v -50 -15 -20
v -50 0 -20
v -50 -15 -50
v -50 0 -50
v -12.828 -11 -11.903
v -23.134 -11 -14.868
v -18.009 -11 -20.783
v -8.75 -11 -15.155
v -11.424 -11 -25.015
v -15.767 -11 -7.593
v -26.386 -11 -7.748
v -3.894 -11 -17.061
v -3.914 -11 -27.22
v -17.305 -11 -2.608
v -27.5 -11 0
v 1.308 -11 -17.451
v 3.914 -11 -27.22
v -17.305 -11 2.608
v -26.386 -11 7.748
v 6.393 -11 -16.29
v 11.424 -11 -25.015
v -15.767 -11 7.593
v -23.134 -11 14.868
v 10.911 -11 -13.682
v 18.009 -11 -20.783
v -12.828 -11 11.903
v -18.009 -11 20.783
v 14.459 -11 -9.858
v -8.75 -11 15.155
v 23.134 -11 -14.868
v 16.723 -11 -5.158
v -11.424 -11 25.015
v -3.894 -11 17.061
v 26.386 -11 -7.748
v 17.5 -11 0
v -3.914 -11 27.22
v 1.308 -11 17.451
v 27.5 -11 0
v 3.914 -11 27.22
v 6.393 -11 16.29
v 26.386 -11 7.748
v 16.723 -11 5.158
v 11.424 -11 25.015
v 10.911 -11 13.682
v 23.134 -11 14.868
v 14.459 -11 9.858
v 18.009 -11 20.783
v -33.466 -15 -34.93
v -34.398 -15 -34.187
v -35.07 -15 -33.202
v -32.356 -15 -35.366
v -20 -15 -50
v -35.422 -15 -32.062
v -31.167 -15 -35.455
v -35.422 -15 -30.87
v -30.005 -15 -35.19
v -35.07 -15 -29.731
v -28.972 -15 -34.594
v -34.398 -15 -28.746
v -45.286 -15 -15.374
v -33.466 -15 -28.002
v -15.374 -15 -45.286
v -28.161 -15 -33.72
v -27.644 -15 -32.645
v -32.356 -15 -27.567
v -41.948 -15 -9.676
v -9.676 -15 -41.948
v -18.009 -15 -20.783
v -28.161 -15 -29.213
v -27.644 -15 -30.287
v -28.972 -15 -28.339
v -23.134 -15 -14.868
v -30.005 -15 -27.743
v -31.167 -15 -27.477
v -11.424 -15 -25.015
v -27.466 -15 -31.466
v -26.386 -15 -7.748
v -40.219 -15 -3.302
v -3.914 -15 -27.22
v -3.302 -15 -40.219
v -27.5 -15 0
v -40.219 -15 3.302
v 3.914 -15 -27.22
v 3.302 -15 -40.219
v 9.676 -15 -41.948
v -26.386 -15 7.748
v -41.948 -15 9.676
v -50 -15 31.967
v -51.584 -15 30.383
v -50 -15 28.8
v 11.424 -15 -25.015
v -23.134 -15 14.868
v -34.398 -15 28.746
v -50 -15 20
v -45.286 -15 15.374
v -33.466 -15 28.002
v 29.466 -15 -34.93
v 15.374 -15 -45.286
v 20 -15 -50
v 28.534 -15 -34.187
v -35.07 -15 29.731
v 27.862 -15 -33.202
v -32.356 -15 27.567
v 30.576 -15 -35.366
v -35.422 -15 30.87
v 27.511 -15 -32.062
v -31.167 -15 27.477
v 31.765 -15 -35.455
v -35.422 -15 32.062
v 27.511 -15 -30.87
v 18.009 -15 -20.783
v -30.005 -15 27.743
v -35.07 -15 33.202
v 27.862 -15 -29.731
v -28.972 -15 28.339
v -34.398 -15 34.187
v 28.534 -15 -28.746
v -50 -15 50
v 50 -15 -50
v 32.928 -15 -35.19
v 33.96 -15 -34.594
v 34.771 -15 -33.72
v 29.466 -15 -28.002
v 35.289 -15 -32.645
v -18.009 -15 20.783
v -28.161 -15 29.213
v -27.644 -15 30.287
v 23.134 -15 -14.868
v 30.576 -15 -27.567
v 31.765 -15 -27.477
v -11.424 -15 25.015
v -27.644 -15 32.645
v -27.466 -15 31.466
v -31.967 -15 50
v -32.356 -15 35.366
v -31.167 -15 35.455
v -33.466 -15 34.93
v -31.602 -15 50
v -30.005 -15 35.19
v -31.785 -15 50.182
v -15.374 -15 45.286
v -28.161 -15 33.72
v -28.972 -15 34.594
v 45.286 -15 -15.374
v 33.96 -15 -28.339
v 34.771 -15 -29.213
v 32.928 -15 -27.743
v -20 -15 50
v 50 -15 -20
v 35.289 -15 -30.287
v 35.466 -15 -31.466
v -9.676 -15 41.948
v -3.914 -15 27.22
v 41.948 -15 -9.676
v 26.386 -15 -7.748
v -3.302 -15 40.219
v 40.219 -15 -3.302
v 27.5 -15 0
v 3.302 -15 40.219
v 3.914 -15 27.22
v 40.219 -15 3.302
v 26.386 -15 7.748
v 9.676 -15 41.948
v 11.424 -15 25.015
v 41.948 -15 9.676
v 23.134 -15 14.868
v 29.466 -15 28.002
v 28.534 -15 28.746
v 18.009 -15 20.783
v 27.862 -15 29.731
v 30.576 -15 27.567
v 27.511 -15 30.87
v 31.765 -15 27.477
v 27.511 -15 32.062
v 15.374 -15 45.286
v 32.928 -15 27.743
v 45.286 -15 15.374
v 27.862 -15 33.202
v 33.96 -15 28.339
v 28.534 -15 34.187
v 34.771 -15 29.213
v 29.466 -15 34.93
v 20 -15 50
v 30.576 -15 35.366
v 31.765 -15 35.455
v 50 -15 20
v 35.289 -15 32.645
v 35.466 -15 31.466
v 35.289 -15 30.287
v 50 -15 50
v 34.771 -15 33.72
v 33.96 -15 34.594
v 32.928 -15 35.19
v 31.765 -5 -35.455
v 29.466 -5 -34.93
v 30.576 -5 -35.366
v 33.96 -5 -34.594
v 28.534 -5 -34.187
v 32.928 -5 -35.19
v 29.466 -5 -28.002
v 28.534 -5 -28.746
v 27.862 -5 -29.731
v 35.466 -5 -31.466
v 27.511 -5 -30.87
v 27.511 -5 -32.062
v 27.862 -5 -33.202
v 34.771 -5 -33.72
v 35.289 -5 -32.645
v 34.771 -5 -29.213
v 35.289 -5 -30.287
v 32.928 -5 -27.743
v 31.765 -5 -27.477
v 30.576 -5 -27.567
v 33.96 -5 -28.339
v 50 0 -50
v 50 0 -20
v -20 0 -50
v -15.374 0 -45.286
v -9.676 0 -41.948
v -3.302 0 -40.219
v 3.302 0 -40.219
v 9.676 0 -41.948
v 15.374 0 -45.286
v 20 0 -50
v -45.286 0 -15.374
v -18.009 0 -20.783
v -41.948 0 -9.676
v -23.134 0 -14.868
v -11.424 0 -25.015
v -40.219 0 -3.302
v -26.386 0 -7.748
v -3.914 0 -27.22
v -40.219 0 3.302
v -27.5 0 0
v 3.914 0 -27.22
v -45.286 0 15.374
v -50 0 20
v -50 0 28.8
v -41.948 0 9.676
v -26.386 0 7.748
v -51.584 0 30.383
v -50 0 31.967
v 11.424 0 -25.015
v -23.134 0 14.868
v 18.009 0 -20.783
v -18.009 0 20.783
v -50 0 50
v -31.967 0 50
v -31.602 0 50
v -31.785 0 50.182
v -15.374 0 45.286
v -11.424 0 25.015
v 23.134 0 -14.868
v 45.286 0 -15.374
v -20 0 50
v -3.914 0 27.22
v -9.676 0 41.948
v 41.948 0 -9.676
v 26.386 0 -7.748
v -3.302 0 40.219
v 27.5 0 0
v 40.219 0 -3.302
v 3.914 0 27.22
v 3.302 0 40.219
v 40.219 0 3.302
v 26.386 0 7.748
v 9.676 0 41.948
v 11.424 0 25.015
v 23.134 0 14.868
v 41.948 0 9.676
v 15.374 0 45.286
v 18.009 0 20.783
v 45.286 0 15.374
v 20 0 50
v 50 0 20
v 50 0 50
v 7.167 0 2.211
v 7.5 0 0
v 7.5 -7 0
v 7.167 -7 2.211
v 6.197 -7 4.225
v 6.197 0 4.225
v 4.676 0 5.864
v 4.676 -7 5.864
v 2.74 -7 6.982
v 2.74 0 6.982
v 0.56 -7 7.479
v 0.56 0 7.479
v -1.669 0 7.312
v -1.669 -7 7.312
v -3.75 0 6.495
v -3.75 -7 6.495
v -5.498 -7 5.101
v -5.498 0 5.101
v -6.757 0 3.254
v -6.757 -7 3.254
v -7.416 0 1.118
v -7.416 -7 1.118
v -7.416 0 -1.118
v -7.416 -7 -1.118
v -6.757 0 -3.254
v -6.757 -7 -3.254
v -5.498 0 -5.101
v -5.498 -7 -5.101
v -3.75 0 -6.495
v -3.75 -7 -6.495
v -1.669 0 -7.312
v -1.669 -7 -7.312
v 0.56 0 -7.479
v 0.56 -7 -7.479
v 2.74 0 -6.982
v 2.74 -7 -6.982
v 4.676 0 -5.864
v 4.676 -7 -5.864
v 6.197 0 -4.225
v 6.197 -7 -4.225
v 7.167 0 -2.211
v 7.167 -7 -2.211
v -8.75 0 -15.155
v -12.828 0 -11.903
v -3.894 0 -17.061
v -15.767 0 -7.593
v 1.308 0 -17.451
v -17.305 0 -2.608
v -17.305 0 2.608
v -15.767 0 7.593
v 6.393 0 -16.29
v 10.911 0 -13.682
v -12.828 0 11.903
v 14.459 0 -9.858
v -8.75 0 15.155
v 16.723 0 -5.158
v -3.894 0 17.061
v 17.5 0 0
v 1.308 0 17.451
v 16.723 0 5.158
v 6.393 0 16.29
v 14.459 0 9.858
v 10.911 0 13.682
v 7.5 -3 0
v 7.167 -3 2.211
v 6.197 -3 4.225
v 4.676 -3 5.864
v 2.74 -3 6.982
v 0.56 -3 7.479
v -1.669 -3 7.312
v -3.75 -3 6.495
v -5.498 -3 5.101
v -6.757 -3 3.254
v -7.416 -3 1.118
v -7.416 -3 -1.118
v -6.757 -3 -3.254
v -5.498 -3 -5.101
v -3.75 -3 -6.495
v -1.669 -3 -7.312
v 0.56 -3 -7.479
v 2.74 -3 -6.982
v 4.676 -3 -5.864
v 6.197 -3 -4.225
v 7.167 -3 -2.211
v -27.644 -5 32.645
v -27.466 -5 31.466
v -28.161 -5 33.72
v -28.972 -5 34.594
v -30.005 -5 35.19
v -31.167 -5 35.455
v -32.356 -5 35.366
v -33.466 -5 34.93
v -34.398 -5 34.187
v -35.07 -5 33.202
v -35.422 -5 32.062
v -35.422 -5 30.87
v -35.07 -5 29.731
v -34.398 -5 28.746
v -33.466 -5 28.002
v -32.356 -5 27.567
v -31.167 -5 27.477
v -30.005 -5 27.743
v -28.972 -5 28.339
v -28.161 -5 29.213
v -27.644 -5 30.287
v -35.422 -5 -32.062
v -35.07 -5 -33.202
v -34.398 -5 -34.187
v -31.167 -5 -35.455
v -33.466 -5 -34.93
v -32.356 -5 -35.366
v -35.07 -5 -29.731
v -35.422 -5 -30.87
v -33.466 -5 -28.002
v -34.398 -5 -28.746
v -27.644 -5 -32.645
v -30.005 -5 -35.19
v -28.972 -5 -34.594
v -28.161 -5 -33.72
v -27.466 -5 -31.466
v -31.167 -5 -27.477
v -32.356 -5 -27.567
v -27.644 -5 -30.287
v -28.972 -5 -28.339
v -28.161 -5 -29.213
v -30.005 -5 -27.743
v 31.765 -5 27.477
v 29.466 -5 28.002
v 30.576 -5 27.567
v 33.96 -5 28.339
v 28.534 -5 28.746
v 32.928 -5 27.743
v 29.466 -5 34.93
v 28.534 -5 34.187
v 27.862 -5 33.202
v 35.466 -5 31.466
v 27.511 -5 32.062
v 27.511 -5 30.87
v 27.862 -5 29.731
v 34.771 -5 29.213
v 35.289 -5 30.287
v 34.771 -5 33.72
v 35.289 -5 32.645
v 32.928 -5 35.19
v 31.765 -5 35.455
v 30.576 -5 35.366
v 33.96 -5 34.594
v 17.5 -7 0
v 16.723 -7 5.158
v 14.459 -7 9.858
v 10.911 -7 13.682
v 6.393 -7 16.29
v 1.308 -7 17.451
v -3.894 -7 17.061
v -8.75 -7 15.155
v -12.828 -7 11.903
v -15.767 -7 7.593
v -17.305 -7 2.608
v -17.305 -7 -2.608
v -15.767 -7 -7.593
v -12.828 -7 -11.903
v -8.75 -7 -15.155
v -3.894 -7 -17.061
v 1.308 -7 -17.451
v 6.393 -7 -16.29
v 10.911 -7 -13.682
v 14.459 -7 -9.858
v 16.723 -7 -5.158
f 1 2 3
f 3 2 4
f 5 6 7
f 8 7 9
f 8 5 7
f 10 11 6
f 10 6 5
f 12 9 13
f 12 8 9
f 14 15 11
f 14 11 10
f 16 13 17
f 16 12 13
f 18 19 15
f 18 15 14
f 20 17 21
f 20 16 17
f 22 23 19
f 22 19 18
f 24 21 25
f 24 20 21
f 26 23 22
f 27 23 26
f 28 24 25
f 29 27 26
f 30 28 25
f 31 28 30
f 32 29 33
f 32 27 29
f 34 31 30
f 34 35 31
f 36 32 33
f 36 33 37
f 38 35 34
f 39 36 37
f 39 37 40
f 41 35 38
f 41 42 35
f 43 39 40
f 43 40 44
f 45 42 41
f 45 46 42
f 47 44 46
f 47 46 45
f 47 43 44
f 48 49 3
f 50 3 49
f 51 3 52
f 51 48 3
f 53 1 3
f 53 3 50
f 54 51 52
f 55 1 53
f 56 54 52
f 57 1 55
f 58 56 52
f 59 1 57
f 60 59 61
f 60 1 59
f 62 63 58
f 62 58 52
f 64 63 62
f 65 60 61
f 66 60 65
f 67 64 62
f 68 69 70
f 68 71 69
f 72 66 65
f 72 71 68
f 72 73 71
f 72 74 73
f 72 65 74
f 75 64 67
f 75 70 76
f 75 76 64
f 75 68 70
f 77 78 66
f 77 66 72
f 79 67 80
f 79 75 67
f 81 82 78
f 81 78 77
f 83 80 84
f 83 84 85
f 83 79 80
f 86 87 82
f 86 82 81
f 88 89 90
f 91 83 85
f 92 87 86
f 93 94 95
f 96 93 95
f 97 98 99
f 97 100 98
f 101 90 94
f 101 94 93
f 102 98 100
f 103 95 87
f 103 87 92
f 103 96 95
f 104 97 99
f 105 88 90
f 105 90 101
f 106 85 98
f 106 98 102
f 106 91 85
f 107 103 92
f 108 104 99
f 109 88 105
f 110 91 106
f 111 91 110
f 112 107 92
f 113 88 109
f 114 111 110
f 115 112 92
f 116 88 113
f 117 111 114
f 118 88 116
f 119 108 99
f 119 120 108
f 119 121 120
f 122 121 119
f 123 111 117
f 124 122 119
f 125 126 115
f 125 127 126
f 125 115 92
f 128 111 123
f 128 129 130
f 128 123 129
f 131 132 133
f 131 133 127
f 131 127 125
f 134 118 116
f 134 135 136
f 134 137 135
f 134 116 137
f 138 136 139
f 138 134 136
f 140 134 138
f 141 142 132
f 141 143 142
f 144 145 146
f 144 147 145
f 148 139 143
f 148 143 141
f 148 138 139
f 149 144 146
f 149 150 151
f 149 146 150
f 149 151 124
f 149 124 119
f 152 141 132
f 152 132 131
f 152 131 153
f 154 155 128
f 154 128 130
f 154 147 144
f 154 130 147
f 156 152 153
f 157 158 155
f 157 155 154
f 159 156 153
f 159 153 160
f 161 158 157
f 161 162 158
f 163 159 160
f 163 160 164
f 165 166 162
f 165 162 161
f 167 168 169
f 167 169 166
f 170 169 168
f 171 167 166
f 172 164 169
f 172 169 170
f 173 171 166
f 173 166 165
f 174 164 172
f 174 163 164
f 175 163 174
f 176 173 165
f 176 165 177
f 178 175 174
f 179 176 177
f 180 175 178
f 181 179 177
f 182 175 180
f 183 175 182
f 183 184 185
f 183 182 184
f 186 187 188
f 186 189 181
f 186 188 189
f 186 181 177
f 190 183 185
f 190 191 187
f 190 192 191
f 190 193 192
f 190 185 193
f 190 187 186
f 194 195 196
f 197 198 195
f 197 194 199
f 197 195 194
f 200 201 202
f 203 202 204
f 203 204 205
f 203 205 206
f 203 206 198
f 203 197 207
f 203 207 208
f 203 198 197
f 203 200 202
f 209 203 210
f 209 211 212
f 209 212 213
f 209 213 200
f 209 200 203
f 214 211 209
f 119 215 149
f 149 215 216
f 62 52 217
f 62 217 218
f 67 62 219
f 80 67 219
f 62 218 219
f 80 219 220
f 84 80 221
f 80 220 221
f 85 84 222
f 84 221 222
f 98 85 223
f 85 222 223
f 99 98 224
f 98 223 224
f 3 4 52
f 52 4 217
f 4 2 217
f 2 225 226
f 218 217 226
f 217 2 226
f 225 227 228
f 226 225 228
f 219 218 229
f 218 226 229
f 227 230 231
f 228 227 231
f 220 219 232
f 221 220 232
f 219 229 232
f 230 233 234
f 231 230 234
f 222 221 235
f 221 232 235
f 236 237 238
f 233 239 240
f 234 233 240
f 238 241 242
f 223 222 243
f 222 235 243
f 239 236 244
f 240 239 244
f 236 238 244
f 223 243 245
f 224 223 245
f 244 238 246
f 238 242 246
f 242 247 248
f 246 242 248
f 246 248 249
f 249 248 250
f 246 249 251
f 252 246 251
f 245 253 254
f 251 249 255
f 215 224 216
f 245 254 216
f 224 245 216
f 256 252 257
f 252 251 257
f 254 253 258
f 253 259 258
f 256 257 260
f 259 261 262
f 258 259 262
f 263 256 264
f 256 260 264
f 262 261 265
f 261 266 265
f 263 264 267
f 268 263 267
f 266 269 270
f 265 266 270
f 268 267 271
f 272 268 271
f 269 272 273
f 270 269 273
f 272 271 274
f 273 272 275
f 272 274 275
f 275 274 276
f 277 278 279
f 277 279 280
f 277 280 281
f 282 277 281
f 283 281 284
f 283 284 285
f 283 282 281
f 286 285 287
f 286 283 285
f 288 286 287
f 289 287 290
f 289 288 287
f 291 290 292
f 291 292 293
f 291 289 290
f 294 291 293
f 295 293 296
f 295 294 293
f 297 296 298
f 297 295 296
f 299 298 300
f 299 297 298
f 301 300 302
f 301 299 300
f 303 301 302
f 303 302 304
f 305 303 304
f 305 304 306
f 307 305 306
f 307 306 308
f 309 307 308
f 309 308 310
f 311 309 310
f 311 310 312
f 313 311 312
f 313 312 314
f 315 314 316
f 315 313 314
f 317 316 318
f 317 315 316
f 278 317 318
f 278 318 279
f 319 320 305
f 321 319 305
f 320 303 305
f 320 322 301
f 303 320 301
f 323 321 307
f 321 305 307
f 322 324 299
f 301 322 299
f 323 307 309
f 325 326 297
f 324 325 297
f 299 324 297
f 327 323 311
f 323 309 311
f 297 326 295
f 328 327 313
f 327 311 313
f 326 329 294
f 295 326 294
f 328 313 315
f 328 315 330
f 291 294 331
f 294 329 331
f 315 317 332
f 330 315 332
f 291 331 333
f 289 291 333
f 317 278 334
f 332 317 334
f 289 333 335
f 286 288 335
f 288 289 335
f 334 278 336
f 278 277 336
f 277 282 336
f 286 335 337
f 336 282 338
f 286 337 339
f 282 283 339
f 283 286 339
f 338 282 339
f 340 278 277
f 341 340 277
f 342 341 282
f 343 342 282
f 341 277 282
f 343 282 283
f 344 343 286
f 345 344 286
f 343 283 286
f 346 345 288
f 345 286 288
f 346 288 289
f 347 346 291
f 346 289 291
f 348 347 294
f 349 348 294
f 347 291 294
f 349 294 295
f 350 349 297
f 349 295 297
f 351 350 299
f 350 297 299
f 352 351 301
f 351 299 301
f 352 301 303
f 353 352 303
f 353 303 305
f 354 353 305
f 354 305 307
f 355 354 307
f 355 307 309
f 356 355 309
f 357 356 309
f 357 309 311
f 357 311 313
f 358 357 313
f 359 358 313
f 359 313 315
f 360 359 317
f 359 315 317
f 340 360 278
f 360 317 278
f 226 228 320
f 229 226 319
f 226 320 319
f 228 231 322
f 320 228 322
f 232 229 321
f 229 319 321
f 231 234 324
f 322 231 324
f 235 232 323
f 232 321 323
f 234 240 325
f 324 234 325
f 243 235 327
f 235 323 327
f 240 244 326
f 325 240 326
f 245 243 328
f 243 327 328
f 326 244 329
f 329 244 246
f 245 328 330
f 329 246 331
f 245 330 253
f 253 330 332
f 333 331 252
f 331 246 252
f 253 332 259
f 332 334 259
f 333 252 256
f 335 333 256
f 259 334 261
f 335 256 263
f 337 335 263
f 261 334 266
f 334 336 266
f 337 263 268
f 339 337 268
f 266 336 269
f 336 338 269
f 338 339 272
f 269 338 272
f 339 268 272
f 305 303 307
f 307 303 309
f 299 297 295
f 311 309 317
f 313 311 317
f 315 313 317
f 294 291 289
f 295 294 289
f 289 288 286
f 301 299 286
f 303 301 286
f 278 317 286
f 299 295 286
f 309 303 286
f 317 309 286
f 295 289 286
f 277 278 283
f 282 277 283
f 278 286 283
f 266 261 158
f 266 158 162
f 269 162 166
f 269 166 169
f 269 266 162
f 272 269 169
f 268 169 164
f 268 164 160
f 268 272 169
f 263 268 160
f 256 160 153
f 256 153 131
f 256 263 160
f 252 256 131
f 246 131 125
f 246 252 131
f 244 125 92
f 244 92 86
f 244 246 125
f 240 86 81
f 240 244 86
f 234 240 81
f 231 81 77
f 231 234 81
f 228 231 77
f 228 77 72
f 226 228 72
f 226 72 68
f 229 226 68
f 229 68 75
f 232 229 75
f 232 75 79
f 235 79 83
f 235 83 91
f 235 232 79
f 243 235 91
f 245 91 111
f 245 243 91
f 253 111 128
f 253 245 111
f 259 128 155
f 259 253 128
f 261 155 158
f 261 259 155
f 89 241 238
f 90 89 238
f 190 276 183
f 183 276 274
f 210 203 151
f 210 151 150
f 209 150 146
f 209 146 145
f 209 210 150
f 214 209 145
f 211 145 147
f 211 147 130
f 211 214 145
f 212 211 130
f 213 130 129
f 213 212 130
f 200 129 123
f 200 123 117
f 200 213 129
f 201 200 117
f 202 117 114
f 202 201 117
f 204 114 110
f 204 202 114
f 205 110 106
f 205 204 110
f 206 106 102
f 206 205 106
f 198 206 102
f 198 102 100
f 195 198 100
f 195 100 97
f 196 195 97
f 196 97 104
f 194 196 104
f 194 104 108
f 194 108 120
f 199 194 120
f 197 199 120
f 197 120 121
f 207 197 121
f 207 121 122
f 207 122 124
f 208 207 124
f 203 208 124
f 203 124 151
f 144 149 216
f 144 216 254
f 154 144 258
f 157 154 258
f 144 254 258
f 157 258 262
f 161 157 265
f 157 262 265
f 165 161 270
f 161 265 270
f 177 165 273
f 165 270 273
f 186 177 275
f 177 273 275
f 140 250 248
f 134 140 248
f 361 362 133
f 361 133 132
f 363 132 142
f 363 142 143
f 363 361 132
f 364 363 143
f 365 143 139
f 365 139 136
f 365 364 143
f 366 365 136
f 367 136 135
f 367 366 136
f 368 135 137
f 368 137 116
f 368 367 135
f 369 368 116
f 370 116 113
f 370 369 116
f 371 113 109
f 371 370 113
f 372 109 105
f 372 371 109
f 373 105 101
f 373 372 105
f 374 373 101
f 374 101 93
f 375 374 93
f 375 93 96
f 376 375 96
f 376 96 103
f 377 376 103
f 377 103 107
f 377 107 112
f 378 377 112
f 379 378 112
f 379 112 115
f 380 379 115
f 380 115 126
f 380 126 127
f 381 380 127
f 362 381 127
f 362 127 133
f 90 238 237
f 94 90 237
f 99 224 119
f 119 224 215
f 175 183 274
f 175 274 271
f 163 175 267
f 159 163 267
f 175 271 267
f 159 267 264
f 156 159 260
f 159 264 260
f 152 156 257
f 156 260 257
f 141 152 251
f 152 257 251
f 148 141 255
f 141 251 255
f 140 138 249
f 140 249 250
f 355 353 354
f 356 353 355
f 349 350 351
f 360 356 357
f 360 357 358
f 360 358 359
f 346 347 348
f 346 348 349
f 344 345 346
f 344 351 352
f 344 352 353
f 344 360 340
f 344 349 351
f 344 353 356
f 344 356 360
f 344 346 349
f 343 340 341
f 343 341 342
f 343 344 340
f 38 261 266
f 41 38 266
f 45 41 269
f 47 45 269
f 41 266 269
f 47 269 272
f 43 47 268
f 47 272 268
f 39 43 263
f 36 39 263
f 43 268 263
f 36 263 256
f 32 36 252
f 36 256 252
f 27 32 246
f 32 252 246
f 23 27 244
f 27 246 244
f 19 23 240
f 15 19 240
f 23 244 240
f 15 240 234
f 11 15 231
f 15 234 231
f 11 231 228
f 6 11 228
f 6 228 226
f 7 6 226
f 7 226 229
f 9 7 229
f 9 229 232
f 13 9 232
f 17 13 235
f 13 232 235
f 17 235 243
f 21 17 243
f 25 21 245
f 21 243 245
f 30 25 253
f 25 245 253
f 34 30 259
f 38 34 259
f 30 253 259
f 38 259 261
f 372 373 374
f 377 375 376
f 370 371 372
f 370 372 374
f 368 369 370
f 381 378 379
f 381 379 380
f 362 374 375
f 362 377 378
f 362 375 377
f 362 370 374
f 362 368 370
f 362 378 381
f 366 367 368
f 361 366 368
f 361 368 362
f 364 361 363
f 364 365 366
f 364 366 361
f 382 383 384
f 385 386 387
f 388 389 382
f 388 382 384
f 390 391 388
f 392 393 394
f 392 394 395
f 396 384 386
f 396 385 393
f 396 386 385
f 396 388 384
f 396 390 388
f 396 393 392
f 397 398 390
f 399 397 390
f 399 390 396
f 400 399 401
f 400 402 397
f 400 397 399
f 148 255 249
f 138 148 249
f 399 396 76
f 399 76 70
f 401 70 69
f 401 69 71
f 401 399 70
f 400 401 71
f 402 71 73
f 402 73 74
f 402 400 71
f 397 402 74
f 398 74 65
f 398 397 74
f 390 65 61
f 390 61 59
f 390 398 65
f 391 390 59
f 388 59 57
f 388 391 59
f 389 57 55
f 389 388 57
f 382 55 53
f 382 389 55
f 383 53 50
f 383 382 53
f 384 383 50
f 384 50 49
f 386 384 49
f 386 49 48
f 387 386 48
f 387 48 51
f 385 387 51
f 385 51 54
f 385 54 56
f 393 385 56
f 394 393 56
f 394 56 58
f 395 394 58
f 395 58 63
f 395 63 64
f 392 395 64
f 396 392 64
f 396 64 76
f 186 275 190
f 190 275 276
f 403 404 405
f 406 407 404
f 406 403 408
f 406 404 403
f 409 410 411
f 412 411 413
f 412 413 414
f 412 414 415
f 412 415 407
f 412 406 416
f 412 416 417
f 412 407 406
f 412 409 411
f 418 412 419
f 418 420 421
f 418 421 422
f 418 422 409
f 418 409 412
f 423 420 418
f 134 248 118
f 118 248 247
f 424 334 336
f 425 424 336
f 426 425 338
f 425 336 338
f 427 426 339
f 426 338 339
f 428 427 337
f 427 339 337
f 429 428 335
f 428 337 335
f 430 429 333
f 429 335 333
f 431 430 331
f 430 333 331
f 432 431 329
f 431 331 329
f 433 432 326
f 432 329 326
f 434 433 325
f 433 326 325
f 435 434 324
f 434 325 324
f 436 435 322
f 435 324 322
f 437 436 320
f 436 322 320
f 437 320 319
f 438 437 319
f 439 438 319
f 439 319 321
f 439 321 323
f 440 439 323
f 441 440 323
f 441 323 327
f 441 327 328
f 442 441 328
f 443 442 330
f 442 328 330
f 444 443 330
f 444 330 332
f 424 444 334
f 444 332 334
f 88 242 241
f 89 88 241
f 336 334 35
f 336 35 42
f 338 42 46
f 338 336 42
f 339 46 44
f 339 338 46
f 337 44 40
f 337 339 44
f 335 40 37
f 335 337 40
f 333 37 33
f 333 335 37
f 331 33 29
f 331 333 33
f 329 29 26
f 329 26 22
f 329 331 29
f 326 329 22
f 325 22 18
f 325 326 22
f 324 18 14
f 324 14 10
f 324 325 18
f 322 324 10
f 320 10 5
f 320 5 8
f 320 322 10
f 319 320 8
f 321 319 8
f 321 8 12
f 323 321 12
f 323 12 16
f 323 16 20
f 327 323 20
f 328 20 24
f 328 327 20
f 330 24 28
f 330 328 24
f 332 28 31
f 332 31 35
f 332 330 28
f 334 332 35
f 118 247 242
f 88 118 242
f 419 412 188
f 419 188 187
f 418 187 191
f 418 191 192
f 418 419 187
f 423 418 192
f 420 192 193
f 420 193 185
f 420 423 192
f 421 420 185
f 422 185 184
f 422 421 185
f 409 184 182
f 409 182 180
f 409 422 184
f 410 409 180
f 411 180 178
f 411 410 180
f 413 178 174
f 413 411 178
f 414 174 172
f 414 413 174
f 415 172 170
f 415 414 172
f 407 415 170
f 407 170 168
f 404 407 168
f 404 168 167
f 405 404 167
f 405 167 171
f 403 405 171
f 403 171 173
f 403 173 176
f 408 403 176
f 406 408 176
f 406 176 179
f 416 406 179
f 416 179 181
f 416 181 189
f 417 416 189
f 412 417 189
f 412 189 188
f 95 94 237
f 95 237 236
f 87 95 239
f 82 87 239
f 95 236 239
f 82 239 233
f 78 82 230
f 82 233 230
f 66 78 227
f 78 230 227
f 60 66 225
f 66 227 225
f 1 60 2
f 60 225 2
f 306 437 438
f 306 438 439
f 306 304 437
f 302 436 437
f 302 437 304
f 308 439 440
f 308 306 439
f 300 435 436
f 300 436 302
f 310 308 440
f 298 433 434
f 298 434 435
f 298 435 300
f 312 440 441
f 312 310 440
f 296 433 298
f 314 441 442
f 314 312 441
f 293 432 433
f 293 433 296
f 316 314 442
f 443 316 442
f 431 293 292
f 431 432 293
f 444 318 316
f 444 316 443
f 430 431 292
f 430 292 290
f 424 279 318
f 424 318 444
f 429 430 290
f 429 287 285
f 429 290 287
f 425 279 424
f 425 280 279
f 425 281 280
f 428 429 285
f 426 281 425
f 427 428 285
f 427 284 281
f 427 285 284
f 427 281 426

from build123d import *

# Parameters (mm, degrees)
F0_R     = 4
F0_R_2   = 27.5
F1_DEPTH = 15
F0_R_3   = 17.5
F2_DEPTH = 11
F0_R_4   = 7.5
F3_DEPTH = 7
F4_DEPTH = 3
F5_DEPTH = 5


with BuildPart() as f1:
    # F0 (on Front) → F1 (new body)
    with BuildSketch(Plane.XZ):
        Polygon((-31.9668788359, 50), (-50, 50), (-50, 31.9668788358), align=None)
        Polygon((-31.9668788359, 50), (-50, 31.9668788358), (-50, 28.79981719), (-35.7023821371, 14.5021993271), (-15.9033922639, 34.3011892003), (-31.6022030636, 50), align=None)
        with Locations((-31.4662517628, 31.4662517628)):
            Circle(F0_R, mode=Mode.SUBTRACT)
        Polygon((-50, 28.79981719), (-50, 31.9668788358), (-51.5835308229, 30.3833480129), align=None)
        Polygon((-31.7845409497, 50.1823378861), (-31.9668788359, 50), (-31.6022030636, 50), align=None)
        with BuildLine():
            Line((-35.7023821371, 14.5021993271), (-50, 28.79981719))
            Line((-50, 28.79981719), (-50, 20))
            ThreePointArc((-50, 20), (-40, 0), (-50, -20))
            Line((-50, -20), (-50, -50))
            Line((-50, -50), (-20, -50))
            ThreePointArc((-20, -50), (0, -40), (20, -50))
            Line((20, -50), (50, -50))
            Line((50, -50), (50, -20))
            ThreePointArc((50, -20), (40, 0), (50, 20))
            Line((50, 20), (50, 50))
            Line((50, 50), (20, 50))
            ThreePointArc((20, 50), (0, 40), (-20, 50))
            Line((-20, 50), (-31.6022030636, 50))
            Line((-31.6022030636, 50), (-15.9033922639, 34.3011892003))
            Line((-15.9033922639, 34.3011892003), (-35.7023821371, 14.5021993271))
        make_face()
        with Locations((-31.4662517628, -31.4662517628)):
            Circle(F0_R, mode=Mode.SUBTRACT)
        with Locations((31.4662517628, -31.4662517628)):
            Circle(F0_R, mode=Mode.SUBTRACT)
        Circle(F0_R_2, mode=Mode.SUBTRACT)
        with Locations((31.4662517628, 31.4662517628)):
            Circle(F0_R, mode=Mode.SUBTRACT)
    extrude(amount=F1_DEPTH)

    # F0 (on Front) → F5 (join)
    with BuildSketch(Plane.XZ):
        with Locations((-31.4662517628, 31.4662517628)):
            Circle(F0_R)
        with Locations((31.4662517628, 31.4662517628)):
            Circle(F0_R)
        with Locations((31.4662517628, -31.4662517628)):
            Circle(F0_R)
        with Locations((-31.4662517628, -31.4662517628)):
            Circle(F0_R)
    extrude(amount=F5_DEPTH)


with BuildPart() as f2:
    # F0 (on Front) → F2 (new body)
    with BuildSketch(Plane.XZ):
        Circle(F0_R_2)
        Circle(F0_R_3, mode=Mode.SUBTRACT)
    extrude(amount=F2_DEPTH)


with BuildPart() as f3:
    # F0 (on Front) → F3 (new body)
    with BuildSketch(Plane.XZ):
        Circle(F0_R_3)
        Circle(F0_R_4, mode=Mode.SUBTRACT)
    extrude(amount=F3_DEPTH)


with BuildPart() as f4:
    # F0 (on Front) → F4 (new body)
    with BuildSketch(Plane.XZ):
        Circle(F0_R_4)
    extrude(amount=F4_DEPTH)


solid = Compound([f1.part, f2.part, f3.part, f4.part])
